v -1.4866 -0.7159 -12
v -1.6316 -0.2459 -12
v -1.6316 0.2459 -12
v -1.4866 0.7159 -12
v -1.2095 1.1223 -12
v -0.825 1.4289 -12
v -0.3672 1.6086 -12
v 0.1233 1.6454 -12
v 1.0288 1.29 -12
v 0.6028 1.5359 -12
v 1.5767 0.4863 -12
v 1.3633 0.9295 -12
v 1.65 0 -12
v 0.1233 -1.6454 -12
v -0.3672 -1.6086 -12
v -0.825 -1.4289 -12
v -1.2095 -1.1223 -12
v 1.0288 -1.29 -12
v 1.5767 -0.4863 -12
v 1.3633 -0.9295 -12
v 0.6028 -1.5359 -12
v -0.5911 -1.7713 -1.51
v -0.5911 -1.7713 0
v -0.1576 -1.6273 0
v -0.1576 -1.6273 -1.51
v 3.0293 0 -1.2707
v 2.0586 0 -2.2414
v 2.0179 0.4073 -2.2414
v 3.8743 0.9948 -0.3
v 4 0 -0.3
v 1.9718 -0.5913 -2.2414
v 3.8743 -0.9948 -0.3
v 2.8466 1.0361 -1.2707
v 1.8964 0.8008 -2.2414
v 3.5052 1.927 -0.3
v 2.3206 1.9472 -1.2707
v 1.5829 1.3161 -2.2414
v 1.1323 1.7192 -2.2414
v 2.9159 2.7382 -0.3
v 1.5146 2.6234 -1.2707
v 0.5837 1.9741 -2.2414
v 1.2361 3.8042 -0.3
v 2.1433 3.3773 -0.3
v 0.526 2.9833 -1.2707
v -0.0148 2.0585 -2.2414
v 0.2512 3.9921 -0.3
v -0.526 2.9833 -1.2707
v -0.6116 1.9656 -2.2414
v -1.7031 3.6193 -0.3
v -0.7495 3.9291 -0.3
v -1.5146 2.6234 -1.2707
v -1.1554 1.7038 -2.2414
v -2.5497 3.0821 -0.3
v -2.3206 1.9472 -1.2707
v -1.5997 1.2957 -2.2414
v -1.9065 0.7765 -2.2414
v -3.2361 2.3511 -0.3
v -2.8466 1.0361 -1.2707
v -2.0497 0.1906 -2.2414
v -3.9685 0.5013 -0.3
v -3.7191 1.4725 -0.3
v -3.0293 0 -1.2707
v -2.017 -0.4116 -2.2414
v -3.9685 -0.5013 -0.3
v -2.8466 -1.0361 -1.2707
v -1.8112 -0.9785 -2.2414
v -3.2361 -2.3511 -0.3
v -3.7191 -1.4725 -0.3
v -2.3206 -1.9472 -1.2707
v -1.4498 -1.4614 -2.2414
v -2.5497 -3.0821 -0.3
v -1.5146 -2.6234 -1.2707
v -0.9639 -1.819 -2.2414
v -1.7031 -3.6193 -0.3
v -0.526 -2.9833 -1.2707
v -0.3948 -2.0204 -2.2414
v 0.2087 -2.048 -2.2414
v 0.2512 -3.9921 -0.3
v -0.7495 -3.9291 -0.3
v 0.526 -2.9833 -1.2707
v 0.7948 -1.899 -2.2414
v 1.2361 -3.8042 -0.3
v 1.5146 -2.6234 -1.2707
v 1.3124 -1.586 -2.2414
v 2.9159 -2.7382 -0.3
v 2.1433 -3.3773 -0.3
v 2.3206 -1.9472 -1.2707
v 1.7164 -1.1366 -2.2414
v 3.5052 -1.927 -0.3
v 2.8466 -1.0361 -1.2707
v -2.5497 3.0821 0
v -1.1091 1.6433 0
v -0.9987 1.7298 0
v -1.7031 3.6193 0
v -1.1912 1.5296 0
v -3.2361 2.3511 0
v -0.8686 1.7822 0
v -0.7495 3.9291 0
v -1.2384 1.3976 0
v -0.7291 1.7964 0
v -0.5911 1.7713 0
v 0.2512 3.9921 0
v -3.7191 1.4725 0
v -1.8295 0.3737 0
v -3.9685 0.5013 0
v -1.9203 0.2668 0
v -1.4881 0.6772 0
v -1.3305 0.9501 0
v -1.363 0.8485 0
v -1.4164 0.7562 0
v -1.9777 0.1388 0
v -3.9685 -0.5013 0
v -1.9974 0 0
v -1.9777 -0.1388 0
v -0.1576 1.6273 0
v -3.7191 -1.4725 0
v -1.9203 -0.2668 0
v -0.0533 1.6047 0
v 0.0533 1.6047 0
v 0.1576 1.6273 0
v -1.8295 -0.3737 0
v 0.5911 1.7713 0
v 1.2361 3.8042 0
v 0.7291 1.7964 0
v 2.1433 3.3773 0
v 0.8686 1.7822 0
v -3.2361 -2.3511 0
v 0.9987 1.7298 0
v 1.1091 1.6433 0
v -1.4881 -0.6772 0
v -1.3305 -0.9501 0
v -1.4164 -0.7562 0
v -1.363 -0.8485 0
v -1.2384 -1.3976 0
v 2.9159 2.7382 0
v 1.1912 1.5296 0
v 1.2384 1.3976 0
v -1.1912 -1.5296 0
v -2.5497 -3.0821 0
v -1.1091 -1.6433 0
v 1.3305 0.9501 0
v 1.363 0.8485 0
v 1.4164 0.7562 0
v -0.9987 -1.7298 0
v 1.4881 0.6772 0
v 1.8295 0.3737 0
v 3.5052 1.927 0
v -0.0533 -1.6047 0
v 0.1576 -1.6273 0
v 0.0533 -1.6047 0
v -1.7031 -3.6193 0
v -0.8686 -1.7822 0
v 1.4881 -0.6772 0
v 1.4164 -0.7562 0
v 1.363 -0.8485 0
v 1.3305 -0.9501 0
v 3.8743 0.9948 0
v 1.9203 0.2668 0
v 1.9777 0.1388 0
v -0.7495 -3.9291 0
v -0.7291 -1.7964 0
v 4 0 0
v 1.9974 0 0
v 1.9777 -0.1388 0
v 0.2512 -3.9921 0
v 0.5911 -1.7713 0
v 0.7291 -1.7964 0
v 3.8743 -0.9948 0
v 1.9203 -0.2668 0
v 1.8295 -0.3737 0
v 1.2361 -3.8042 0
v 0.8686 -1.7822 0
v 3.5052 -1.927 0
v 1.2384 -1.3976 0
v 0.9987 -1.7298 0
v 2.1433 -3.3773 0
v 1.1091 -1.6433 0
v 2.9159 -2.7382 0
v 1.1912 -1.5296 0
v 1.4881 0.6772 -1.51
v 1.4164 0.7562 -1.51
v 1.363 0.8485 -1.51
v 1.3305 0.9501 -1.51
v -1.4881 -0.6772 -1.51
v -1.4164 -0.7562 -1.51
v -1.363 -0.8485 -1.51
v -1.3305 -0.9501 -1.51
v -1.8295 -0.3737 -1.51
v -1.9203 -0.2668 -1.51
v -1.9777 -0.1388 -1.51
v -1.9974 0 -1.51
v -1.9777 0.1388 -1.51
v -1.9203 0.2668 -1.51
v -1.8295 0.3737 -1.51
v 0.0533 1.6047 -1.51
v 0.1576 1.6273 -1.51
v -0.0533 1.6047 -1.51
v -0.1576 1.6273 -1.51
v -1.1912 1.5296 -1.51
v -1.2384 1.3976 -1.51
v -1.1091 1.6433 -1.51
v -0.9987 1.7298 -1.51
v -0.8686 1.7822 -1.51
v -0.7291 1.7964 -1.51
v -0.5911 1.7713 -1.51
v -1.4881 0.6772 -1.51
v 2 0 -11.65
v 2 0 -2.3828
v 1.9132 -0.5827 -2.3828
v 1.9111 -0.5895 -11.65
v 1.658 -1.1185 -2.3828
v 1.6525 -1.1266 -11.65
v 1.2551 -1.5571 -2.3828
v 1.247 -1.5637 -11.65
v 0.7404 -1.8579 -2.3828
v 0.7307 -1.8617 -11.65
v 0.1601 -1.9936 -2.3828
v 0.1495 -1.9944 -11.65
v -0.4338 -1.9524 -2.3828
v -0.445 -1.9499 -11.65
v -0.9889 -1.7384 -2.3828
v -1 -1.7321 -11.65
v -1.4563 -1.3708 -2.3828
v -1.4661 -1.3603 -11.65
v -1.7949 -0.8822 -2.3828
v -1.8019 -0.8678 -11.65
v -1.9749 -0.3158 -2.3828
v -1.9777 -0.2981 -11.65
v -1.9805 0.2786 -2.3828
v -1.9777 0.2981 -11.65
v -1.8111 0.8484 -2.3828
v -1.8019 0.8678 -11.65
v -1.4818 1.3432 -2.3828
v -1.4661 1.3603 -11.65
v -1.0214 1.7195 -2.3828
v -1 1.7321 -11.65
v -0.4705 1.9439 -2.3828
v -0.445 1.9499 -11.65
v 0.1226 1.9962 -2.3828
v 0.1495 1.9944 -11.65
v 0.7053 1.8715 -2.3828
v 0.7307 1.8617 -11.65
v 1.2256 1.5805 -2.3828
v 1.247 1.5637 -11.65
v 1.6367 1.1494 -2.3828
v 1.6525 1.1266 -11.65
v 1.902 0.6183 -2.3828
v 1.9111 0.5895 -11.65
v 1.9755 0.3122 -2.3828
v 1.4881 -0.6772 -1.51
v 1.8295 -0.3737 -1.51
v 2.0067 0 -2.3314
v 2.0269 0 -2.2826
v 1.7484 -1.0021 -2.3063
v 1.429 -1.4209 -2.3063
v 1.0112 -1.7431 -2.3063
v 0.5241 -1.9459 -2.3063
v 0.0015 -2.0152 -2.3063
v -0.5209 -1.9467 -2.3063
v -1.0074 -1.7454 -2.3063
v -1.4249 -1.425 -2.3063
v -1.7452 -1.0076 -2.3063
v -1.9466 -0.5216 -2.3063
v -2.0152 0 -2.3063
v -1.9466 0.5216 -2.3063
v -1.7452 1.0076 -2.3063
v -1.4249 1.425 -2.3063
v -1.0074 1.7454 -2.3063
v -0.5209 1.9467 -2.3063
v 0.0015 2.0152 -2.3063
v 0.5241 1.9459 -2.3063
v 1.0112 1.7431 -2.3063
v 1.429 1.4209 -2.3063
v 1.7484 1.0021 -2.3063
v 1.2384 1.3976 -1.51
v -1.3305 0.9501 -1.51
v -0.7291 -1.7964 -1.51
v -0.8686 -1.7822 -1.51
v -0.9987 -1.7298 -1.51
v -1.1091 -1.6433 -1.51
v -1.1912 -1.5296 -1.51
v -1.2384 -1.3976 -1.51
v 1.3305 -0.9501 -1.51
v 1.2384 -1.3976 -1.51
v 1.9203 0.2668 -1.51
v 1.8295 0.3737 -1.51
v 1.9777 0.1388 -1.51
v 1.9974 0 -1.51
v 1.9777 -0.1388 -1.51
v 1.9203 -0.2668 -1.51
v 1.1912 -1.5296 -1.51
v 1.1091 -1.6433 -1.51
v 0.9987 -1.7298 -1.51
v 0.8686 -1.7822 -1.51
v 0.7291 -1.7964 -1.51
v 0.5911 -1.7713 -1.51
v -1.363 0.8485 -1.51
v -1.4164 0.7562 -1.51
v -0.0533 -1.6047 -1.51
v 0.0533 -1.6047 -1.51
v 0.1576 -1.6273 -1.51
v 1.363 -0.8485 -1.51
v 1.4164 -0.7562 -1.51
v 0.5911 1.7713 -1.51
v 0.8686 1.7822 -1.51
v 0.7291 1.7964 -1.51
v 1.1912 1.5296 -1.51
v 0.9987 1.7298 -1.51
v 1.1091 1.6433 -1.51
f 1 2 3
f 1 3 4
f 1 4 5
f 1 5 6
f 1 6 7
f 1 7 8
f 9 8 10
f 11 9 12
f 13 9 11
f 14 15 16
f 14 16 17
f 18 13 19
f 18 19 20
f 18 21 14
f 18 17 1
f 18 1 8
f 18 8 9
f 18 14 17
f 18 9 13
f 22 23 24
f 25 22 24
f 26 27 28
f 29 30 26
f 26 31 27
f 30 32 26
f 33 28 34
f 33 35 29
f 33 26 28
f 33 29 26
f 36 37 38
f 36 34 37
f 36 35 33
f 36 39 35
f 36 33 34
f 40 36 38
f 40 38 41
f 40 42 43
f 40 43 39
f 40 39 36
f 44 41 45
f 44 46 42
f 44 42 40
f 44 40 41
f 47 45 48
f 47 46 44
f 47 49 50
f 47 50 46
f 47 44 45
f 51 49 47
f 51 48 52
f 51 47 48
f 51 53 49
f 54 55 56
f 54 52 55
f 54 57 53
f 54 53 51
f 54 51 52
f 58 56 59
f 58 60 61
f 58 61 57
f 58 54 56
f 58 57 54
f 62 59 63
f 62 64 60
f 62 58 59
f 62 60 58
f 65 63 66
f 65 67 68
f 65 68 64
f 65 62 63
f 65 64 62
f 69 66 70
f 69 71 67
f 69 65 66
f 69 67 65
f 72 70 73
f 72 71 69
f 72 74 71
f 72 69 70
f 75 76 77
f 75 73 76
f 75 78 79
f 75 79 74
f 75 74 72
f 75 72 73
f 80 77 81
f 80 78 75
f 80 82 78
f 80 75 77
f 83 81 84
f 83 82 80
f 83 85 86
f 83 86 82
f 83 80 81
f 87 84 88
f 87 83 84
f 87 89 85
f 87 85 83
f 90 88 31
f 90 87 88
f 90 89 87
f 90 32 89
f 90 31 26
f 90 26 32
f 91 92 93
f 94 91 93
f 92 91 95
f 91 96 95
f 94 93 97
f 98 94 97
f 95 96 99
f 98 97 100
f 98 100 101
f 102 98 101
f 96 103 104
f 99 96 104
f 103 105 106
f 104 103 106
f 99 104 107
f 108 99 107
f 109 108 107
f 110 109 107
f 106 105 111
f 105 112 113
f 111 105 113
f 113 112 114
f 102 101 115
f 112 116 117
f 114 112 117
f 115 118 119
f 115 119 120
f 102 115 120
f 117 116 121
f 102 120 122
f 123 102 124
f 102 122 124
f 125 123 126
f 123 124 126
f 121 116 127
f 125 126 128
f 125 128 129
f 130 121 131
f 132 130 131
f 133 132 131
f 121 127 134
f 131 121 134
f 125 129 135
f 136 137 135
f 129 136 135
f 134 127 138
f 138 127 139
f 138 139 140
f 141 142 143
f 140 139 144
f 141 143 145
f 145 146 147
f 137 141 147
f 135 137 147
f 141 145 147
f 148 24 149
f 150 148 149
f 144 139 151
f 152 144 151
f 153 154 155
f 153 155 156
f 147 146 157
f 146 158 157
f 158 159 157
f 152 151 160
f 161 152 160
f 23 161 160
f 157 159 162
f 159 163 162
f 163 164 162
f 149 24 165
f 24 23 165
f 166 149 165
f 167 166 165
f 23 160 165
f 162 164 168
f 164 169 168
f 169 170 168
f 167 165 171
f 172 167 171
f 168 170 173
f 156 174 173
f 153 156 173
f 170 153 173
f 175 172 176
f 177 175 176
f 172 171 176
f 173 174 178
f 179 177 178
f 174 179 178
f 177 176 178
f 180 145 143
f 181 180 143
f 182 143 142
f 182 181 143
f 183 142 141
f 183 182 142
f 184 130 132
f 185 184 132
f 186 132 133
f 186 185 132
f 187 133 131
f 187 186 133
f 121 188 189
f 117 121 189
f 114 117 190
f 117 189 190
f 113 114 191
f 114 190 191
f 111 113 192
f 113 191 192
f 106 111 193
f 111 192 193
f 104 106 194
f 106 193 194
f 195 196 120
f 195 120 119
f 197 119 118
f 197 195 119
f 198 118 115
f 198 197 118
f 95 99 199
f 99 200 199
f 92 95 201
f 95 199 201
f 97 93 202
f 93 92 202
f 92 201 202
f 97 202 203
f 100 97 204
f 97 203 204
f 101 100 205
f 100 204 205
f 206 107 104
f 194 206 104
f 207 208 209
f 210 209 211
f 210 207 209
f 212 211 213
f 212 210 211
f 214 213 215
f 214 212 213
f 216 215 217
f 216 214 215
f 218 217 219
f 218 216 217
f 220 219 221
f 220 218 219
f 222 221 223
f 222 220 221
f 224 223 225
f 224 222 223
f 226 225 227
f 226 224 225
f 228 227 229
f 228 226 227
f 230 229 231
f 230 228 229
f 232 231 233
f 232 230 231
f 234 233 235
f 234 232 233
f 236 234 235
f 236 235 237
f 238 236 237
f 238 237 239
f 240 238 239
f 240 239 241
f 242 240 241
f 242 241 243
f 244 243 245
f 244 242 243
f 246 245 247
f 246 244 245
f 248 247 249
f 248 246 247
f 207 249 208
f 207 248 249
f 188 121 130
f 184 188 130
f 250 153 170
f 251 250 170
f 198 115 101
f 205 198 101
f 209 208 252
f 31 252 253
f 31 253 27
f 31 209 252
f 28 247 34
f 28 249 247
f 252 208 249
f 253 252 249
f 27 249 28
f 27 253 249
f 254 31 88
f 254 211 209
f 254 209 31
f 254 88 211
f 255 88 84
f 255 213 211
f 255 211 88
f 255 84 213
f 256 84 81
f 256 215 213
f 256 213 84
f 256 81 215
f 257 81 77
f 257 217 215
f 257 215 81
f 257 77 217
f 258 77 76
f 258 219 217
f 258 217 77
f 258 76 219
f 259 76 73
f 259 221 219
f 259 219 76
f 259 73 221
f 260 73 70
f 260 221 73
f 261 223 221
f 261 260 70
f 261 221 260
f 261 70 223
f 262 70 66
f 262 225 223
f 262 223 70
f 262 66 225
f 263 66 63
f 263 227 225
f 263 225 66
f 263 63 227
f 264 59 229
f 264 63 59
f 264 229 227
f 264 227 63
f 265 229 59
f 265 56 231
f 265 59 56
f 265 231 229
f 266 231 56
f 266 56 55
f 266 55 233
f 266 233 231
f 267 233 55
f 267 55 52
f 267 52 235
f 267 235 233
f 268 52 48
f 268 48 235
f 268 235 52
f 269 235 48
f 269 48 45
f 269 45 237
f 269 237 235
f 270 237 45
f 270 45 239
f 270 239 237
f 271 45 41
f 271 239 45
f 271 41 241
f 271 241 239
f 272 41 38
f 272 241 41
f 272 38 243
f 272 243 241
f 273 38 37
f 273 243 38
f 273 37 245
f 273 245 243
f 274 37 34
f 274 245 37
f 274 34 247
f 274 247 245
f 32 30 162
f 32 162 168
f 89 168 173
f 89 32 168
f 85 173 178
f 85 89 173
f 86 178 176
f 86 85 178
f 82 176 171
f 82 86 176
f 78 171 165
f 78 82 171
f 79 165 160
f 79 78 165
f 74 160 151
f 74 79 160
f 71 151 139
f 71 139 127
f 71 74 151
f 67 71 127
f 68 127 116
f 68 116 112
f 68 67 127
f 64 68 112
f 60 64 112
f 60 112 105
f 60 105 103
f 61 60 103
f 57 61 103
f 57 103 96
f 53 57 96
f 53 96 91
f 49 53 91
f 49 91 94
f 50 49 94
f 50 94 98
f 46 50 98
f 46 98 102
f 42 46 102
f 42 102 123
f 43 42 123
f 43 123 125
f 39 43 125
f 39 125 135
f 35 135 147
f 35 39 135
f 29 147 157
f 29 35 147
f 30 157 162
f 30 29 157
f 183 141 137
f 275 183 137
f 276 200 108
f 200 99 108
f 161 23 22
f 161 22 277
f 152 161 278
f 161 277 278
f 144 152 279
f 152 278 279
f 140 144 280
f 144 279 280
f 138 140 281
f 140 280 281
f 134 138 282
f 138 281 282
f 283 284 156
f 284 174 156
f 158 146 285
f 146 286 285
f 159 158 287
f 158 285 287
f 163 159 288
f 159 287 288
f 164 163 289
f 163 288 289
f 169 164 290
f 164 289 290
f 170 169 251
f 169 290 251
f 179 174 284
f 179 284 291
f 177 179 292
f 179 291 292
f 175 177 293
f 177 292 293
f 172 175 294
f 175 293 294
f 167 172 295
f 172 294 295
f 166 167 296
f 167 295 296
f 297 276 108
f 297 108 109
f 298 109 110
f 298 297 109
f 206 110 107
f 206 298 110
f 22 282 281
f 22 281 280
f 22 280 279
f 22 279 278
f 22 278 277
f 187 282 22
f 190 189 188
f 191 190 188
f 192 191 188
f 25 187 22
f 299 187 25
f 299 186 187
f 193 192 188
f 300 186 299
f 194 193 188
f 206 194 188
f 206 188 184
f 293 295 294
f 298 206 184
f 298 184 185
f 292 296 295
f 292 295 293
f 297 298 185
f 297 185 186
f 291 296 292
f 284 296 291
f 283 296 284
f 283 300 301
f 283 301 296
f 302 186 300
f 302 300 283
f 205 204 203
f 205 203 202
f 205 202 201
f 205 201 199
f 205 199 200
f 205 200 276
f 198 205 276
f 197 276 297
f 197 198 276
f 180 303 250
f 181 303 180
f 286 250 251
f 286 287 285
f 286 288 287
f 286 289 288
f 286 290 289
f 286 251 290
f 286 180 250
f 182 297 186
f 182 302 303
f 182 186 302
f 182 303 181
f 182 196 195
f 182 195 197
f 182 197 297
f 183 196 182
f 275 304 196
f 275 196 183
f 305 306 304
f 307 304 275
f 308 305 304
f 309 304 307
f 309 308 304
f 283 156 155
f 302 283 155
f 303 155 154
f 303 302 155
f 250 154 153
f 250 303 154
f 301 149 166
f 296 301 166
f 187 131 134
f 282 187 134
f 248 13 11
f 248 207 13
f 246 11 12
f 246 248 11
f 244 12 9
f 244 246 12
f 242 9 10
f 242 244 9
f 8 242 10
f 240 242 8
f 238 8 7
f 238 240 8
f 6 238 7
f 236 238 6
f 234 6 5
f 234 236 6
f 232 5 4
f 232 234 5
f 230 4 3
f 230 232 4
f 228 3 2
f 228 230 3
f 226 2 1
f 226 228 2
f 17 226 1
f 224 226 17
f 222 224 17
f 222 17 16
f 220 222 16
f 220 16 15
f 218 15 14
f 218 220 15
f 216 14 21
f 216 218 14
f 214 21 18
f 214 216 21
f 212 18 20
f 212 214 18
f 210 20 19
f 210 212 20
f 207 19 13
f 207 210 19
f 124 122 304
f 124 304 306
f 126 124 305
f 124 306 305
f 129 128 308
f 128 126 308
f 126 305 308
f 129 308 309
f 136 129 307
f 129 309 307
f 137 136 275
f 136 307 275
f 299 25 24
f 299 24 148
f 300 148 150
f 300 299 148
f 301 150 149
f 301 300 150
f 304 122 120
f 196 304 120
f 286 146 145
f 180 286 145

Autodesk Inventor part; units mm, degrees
ref_plane "YZ Plane" through (0, 0, 0) normal (1, 0, 0) x (0, 1, 0)
sketch "Skizze1" plane through (0, 0, 0) normal (0, 1, 0) x (-1, 0, 0)
  point P0 (0, 0)
sketch "Skizze2" plane through (0, 0, 0) normal (0, 1, 0) x (-1, 0, 0)
  line L0 (-2, -12) -> (0, -12)
  line L1 (-2, -2.3) -> (-2, -12)
  line L2 (-4, -0.3) -> (-2, -2.3)
  line L3 (-4, 0) -> (-4, -0.3)
  line L4 (0, 0) -> (-4, 0)
  line L5 (0, -12) -> (0, 0)
  line L6 (0, -12) -> (0, 0)
  line L7 (0, -14.4) -> (0, 2.4) projected
  line L8 (0.8, 0) -> (-4.8, 0) projected
  dimension "d3" = 4
  dimension "d5" = 2
  dimension "d7" = 12
  dimension "ParC" = 0.3
  dimension "d22" = 0
  dimension "d23" = 0
  dimension "d43" = 45
revolve "Drehung1" add sketch "Skizze2" angle 360 about axis through (0, 0, -12) along (0, 0, -1)
fillet "Rundung1" radius 0.2 1 edges at (-2, 0, -2.3)
chamfer "Fase1" distance 0.35 angle 45 1 edges at (-2, 0, -12) measured on face at (-0.9288, -1.7713, -8.7943)
thread "Gewinde1" size "M4x0.7" class "6g" standard "ISO Metric profile" length 8.3
ref_plane "MSC_PF1" through (0, 0, 0) normal (1, 0, 0) x (0, 1, 0)
ref_plane "MSC_PT1" through (0, 0, 0) normal (0, 0, -1) x (-1, 0, 0)
sketch "Skizze4" plane through (0, 0, 0) normal (0, 0, 1) x (1, 0, 0)
  circle A0 centre (0, 0) radius 2.25
  circle A1 centre (0, 0) radius 1.575
  line L0 (0, 0) -> (1.364, -0.7875)
  line L1 (0, 0) -> (1.364, 0.7875)
  line L2 (1.364, -0.7875) -> (2.25, 0)
  line L3 (2.25, 0) -> (1.364, 0.7875)
  line L4 (-5.6, 0) -> (5.6, 0) projected
  dimension "d45" = 4.5
  dimension "d44" = 3.15
  dimension "d46" = 30
  dimension "d47" = 30
extrude "Extrusion2" cut sketch "Skizze4" against normal blind 1.51 contours L4 A1 L3 | L2 A1 L4 | L0 L4 A1 | A1 L4 L1 picked at (0.948, -0.4421) picked at (0.948, 0.4421)
pattern_circular "Runde Anordnung1" count 6 over 360 about axis through (0, 0, 0) along (0, 0, -1) of "Extrusion2"
fillet "Rundung2" radius 0.5 12 edges at (-1.125, 1.9486, -0.755) (-1.364, 0.7875, -0.755) (0, 1.575, -0.755) (-2.25, 0, -0.755) (1.364, 0.7875, -0.755) (2.25, 0, -0.755) (1.125, 1.9486, -0.755) (1.364, -0.7875, -0.755) (1.125, -1.9486, -0.755) (-1.364, -0.7875, -0.755) (-1.125, -1.9486, -0.755) (0, -1.575, -0.755)
equation "\"d3\" = 0.5 * dk"
equation "\"d5\" = 0.5 * NND"
equation "\"d7\" = NLG"
equation "\"d43\" = 0.5 * ang"
equation "\"d18\" = r"
equation "\"d19\" = 0.5 * PTC"
equation "\"d39\" = 0.5 * PTC"
equation "\"NND\" = 4"
equation "\"PTC\" = 0.7"
equation "\"dk\" = 8"
equation "\"ParK\" = 2.3"
equation "\"ParS\" = 2.5"
equation "\"ParT\" = 1.8"
equation "\"r\" = 0.2"
equation "\"NLG\" = 12"
equation "\"ang\" = 90deg"
equation "\"THREADDIA\" = NND"
properties part number "DIN 7991 - M4x12" material "Stahl, weich"
